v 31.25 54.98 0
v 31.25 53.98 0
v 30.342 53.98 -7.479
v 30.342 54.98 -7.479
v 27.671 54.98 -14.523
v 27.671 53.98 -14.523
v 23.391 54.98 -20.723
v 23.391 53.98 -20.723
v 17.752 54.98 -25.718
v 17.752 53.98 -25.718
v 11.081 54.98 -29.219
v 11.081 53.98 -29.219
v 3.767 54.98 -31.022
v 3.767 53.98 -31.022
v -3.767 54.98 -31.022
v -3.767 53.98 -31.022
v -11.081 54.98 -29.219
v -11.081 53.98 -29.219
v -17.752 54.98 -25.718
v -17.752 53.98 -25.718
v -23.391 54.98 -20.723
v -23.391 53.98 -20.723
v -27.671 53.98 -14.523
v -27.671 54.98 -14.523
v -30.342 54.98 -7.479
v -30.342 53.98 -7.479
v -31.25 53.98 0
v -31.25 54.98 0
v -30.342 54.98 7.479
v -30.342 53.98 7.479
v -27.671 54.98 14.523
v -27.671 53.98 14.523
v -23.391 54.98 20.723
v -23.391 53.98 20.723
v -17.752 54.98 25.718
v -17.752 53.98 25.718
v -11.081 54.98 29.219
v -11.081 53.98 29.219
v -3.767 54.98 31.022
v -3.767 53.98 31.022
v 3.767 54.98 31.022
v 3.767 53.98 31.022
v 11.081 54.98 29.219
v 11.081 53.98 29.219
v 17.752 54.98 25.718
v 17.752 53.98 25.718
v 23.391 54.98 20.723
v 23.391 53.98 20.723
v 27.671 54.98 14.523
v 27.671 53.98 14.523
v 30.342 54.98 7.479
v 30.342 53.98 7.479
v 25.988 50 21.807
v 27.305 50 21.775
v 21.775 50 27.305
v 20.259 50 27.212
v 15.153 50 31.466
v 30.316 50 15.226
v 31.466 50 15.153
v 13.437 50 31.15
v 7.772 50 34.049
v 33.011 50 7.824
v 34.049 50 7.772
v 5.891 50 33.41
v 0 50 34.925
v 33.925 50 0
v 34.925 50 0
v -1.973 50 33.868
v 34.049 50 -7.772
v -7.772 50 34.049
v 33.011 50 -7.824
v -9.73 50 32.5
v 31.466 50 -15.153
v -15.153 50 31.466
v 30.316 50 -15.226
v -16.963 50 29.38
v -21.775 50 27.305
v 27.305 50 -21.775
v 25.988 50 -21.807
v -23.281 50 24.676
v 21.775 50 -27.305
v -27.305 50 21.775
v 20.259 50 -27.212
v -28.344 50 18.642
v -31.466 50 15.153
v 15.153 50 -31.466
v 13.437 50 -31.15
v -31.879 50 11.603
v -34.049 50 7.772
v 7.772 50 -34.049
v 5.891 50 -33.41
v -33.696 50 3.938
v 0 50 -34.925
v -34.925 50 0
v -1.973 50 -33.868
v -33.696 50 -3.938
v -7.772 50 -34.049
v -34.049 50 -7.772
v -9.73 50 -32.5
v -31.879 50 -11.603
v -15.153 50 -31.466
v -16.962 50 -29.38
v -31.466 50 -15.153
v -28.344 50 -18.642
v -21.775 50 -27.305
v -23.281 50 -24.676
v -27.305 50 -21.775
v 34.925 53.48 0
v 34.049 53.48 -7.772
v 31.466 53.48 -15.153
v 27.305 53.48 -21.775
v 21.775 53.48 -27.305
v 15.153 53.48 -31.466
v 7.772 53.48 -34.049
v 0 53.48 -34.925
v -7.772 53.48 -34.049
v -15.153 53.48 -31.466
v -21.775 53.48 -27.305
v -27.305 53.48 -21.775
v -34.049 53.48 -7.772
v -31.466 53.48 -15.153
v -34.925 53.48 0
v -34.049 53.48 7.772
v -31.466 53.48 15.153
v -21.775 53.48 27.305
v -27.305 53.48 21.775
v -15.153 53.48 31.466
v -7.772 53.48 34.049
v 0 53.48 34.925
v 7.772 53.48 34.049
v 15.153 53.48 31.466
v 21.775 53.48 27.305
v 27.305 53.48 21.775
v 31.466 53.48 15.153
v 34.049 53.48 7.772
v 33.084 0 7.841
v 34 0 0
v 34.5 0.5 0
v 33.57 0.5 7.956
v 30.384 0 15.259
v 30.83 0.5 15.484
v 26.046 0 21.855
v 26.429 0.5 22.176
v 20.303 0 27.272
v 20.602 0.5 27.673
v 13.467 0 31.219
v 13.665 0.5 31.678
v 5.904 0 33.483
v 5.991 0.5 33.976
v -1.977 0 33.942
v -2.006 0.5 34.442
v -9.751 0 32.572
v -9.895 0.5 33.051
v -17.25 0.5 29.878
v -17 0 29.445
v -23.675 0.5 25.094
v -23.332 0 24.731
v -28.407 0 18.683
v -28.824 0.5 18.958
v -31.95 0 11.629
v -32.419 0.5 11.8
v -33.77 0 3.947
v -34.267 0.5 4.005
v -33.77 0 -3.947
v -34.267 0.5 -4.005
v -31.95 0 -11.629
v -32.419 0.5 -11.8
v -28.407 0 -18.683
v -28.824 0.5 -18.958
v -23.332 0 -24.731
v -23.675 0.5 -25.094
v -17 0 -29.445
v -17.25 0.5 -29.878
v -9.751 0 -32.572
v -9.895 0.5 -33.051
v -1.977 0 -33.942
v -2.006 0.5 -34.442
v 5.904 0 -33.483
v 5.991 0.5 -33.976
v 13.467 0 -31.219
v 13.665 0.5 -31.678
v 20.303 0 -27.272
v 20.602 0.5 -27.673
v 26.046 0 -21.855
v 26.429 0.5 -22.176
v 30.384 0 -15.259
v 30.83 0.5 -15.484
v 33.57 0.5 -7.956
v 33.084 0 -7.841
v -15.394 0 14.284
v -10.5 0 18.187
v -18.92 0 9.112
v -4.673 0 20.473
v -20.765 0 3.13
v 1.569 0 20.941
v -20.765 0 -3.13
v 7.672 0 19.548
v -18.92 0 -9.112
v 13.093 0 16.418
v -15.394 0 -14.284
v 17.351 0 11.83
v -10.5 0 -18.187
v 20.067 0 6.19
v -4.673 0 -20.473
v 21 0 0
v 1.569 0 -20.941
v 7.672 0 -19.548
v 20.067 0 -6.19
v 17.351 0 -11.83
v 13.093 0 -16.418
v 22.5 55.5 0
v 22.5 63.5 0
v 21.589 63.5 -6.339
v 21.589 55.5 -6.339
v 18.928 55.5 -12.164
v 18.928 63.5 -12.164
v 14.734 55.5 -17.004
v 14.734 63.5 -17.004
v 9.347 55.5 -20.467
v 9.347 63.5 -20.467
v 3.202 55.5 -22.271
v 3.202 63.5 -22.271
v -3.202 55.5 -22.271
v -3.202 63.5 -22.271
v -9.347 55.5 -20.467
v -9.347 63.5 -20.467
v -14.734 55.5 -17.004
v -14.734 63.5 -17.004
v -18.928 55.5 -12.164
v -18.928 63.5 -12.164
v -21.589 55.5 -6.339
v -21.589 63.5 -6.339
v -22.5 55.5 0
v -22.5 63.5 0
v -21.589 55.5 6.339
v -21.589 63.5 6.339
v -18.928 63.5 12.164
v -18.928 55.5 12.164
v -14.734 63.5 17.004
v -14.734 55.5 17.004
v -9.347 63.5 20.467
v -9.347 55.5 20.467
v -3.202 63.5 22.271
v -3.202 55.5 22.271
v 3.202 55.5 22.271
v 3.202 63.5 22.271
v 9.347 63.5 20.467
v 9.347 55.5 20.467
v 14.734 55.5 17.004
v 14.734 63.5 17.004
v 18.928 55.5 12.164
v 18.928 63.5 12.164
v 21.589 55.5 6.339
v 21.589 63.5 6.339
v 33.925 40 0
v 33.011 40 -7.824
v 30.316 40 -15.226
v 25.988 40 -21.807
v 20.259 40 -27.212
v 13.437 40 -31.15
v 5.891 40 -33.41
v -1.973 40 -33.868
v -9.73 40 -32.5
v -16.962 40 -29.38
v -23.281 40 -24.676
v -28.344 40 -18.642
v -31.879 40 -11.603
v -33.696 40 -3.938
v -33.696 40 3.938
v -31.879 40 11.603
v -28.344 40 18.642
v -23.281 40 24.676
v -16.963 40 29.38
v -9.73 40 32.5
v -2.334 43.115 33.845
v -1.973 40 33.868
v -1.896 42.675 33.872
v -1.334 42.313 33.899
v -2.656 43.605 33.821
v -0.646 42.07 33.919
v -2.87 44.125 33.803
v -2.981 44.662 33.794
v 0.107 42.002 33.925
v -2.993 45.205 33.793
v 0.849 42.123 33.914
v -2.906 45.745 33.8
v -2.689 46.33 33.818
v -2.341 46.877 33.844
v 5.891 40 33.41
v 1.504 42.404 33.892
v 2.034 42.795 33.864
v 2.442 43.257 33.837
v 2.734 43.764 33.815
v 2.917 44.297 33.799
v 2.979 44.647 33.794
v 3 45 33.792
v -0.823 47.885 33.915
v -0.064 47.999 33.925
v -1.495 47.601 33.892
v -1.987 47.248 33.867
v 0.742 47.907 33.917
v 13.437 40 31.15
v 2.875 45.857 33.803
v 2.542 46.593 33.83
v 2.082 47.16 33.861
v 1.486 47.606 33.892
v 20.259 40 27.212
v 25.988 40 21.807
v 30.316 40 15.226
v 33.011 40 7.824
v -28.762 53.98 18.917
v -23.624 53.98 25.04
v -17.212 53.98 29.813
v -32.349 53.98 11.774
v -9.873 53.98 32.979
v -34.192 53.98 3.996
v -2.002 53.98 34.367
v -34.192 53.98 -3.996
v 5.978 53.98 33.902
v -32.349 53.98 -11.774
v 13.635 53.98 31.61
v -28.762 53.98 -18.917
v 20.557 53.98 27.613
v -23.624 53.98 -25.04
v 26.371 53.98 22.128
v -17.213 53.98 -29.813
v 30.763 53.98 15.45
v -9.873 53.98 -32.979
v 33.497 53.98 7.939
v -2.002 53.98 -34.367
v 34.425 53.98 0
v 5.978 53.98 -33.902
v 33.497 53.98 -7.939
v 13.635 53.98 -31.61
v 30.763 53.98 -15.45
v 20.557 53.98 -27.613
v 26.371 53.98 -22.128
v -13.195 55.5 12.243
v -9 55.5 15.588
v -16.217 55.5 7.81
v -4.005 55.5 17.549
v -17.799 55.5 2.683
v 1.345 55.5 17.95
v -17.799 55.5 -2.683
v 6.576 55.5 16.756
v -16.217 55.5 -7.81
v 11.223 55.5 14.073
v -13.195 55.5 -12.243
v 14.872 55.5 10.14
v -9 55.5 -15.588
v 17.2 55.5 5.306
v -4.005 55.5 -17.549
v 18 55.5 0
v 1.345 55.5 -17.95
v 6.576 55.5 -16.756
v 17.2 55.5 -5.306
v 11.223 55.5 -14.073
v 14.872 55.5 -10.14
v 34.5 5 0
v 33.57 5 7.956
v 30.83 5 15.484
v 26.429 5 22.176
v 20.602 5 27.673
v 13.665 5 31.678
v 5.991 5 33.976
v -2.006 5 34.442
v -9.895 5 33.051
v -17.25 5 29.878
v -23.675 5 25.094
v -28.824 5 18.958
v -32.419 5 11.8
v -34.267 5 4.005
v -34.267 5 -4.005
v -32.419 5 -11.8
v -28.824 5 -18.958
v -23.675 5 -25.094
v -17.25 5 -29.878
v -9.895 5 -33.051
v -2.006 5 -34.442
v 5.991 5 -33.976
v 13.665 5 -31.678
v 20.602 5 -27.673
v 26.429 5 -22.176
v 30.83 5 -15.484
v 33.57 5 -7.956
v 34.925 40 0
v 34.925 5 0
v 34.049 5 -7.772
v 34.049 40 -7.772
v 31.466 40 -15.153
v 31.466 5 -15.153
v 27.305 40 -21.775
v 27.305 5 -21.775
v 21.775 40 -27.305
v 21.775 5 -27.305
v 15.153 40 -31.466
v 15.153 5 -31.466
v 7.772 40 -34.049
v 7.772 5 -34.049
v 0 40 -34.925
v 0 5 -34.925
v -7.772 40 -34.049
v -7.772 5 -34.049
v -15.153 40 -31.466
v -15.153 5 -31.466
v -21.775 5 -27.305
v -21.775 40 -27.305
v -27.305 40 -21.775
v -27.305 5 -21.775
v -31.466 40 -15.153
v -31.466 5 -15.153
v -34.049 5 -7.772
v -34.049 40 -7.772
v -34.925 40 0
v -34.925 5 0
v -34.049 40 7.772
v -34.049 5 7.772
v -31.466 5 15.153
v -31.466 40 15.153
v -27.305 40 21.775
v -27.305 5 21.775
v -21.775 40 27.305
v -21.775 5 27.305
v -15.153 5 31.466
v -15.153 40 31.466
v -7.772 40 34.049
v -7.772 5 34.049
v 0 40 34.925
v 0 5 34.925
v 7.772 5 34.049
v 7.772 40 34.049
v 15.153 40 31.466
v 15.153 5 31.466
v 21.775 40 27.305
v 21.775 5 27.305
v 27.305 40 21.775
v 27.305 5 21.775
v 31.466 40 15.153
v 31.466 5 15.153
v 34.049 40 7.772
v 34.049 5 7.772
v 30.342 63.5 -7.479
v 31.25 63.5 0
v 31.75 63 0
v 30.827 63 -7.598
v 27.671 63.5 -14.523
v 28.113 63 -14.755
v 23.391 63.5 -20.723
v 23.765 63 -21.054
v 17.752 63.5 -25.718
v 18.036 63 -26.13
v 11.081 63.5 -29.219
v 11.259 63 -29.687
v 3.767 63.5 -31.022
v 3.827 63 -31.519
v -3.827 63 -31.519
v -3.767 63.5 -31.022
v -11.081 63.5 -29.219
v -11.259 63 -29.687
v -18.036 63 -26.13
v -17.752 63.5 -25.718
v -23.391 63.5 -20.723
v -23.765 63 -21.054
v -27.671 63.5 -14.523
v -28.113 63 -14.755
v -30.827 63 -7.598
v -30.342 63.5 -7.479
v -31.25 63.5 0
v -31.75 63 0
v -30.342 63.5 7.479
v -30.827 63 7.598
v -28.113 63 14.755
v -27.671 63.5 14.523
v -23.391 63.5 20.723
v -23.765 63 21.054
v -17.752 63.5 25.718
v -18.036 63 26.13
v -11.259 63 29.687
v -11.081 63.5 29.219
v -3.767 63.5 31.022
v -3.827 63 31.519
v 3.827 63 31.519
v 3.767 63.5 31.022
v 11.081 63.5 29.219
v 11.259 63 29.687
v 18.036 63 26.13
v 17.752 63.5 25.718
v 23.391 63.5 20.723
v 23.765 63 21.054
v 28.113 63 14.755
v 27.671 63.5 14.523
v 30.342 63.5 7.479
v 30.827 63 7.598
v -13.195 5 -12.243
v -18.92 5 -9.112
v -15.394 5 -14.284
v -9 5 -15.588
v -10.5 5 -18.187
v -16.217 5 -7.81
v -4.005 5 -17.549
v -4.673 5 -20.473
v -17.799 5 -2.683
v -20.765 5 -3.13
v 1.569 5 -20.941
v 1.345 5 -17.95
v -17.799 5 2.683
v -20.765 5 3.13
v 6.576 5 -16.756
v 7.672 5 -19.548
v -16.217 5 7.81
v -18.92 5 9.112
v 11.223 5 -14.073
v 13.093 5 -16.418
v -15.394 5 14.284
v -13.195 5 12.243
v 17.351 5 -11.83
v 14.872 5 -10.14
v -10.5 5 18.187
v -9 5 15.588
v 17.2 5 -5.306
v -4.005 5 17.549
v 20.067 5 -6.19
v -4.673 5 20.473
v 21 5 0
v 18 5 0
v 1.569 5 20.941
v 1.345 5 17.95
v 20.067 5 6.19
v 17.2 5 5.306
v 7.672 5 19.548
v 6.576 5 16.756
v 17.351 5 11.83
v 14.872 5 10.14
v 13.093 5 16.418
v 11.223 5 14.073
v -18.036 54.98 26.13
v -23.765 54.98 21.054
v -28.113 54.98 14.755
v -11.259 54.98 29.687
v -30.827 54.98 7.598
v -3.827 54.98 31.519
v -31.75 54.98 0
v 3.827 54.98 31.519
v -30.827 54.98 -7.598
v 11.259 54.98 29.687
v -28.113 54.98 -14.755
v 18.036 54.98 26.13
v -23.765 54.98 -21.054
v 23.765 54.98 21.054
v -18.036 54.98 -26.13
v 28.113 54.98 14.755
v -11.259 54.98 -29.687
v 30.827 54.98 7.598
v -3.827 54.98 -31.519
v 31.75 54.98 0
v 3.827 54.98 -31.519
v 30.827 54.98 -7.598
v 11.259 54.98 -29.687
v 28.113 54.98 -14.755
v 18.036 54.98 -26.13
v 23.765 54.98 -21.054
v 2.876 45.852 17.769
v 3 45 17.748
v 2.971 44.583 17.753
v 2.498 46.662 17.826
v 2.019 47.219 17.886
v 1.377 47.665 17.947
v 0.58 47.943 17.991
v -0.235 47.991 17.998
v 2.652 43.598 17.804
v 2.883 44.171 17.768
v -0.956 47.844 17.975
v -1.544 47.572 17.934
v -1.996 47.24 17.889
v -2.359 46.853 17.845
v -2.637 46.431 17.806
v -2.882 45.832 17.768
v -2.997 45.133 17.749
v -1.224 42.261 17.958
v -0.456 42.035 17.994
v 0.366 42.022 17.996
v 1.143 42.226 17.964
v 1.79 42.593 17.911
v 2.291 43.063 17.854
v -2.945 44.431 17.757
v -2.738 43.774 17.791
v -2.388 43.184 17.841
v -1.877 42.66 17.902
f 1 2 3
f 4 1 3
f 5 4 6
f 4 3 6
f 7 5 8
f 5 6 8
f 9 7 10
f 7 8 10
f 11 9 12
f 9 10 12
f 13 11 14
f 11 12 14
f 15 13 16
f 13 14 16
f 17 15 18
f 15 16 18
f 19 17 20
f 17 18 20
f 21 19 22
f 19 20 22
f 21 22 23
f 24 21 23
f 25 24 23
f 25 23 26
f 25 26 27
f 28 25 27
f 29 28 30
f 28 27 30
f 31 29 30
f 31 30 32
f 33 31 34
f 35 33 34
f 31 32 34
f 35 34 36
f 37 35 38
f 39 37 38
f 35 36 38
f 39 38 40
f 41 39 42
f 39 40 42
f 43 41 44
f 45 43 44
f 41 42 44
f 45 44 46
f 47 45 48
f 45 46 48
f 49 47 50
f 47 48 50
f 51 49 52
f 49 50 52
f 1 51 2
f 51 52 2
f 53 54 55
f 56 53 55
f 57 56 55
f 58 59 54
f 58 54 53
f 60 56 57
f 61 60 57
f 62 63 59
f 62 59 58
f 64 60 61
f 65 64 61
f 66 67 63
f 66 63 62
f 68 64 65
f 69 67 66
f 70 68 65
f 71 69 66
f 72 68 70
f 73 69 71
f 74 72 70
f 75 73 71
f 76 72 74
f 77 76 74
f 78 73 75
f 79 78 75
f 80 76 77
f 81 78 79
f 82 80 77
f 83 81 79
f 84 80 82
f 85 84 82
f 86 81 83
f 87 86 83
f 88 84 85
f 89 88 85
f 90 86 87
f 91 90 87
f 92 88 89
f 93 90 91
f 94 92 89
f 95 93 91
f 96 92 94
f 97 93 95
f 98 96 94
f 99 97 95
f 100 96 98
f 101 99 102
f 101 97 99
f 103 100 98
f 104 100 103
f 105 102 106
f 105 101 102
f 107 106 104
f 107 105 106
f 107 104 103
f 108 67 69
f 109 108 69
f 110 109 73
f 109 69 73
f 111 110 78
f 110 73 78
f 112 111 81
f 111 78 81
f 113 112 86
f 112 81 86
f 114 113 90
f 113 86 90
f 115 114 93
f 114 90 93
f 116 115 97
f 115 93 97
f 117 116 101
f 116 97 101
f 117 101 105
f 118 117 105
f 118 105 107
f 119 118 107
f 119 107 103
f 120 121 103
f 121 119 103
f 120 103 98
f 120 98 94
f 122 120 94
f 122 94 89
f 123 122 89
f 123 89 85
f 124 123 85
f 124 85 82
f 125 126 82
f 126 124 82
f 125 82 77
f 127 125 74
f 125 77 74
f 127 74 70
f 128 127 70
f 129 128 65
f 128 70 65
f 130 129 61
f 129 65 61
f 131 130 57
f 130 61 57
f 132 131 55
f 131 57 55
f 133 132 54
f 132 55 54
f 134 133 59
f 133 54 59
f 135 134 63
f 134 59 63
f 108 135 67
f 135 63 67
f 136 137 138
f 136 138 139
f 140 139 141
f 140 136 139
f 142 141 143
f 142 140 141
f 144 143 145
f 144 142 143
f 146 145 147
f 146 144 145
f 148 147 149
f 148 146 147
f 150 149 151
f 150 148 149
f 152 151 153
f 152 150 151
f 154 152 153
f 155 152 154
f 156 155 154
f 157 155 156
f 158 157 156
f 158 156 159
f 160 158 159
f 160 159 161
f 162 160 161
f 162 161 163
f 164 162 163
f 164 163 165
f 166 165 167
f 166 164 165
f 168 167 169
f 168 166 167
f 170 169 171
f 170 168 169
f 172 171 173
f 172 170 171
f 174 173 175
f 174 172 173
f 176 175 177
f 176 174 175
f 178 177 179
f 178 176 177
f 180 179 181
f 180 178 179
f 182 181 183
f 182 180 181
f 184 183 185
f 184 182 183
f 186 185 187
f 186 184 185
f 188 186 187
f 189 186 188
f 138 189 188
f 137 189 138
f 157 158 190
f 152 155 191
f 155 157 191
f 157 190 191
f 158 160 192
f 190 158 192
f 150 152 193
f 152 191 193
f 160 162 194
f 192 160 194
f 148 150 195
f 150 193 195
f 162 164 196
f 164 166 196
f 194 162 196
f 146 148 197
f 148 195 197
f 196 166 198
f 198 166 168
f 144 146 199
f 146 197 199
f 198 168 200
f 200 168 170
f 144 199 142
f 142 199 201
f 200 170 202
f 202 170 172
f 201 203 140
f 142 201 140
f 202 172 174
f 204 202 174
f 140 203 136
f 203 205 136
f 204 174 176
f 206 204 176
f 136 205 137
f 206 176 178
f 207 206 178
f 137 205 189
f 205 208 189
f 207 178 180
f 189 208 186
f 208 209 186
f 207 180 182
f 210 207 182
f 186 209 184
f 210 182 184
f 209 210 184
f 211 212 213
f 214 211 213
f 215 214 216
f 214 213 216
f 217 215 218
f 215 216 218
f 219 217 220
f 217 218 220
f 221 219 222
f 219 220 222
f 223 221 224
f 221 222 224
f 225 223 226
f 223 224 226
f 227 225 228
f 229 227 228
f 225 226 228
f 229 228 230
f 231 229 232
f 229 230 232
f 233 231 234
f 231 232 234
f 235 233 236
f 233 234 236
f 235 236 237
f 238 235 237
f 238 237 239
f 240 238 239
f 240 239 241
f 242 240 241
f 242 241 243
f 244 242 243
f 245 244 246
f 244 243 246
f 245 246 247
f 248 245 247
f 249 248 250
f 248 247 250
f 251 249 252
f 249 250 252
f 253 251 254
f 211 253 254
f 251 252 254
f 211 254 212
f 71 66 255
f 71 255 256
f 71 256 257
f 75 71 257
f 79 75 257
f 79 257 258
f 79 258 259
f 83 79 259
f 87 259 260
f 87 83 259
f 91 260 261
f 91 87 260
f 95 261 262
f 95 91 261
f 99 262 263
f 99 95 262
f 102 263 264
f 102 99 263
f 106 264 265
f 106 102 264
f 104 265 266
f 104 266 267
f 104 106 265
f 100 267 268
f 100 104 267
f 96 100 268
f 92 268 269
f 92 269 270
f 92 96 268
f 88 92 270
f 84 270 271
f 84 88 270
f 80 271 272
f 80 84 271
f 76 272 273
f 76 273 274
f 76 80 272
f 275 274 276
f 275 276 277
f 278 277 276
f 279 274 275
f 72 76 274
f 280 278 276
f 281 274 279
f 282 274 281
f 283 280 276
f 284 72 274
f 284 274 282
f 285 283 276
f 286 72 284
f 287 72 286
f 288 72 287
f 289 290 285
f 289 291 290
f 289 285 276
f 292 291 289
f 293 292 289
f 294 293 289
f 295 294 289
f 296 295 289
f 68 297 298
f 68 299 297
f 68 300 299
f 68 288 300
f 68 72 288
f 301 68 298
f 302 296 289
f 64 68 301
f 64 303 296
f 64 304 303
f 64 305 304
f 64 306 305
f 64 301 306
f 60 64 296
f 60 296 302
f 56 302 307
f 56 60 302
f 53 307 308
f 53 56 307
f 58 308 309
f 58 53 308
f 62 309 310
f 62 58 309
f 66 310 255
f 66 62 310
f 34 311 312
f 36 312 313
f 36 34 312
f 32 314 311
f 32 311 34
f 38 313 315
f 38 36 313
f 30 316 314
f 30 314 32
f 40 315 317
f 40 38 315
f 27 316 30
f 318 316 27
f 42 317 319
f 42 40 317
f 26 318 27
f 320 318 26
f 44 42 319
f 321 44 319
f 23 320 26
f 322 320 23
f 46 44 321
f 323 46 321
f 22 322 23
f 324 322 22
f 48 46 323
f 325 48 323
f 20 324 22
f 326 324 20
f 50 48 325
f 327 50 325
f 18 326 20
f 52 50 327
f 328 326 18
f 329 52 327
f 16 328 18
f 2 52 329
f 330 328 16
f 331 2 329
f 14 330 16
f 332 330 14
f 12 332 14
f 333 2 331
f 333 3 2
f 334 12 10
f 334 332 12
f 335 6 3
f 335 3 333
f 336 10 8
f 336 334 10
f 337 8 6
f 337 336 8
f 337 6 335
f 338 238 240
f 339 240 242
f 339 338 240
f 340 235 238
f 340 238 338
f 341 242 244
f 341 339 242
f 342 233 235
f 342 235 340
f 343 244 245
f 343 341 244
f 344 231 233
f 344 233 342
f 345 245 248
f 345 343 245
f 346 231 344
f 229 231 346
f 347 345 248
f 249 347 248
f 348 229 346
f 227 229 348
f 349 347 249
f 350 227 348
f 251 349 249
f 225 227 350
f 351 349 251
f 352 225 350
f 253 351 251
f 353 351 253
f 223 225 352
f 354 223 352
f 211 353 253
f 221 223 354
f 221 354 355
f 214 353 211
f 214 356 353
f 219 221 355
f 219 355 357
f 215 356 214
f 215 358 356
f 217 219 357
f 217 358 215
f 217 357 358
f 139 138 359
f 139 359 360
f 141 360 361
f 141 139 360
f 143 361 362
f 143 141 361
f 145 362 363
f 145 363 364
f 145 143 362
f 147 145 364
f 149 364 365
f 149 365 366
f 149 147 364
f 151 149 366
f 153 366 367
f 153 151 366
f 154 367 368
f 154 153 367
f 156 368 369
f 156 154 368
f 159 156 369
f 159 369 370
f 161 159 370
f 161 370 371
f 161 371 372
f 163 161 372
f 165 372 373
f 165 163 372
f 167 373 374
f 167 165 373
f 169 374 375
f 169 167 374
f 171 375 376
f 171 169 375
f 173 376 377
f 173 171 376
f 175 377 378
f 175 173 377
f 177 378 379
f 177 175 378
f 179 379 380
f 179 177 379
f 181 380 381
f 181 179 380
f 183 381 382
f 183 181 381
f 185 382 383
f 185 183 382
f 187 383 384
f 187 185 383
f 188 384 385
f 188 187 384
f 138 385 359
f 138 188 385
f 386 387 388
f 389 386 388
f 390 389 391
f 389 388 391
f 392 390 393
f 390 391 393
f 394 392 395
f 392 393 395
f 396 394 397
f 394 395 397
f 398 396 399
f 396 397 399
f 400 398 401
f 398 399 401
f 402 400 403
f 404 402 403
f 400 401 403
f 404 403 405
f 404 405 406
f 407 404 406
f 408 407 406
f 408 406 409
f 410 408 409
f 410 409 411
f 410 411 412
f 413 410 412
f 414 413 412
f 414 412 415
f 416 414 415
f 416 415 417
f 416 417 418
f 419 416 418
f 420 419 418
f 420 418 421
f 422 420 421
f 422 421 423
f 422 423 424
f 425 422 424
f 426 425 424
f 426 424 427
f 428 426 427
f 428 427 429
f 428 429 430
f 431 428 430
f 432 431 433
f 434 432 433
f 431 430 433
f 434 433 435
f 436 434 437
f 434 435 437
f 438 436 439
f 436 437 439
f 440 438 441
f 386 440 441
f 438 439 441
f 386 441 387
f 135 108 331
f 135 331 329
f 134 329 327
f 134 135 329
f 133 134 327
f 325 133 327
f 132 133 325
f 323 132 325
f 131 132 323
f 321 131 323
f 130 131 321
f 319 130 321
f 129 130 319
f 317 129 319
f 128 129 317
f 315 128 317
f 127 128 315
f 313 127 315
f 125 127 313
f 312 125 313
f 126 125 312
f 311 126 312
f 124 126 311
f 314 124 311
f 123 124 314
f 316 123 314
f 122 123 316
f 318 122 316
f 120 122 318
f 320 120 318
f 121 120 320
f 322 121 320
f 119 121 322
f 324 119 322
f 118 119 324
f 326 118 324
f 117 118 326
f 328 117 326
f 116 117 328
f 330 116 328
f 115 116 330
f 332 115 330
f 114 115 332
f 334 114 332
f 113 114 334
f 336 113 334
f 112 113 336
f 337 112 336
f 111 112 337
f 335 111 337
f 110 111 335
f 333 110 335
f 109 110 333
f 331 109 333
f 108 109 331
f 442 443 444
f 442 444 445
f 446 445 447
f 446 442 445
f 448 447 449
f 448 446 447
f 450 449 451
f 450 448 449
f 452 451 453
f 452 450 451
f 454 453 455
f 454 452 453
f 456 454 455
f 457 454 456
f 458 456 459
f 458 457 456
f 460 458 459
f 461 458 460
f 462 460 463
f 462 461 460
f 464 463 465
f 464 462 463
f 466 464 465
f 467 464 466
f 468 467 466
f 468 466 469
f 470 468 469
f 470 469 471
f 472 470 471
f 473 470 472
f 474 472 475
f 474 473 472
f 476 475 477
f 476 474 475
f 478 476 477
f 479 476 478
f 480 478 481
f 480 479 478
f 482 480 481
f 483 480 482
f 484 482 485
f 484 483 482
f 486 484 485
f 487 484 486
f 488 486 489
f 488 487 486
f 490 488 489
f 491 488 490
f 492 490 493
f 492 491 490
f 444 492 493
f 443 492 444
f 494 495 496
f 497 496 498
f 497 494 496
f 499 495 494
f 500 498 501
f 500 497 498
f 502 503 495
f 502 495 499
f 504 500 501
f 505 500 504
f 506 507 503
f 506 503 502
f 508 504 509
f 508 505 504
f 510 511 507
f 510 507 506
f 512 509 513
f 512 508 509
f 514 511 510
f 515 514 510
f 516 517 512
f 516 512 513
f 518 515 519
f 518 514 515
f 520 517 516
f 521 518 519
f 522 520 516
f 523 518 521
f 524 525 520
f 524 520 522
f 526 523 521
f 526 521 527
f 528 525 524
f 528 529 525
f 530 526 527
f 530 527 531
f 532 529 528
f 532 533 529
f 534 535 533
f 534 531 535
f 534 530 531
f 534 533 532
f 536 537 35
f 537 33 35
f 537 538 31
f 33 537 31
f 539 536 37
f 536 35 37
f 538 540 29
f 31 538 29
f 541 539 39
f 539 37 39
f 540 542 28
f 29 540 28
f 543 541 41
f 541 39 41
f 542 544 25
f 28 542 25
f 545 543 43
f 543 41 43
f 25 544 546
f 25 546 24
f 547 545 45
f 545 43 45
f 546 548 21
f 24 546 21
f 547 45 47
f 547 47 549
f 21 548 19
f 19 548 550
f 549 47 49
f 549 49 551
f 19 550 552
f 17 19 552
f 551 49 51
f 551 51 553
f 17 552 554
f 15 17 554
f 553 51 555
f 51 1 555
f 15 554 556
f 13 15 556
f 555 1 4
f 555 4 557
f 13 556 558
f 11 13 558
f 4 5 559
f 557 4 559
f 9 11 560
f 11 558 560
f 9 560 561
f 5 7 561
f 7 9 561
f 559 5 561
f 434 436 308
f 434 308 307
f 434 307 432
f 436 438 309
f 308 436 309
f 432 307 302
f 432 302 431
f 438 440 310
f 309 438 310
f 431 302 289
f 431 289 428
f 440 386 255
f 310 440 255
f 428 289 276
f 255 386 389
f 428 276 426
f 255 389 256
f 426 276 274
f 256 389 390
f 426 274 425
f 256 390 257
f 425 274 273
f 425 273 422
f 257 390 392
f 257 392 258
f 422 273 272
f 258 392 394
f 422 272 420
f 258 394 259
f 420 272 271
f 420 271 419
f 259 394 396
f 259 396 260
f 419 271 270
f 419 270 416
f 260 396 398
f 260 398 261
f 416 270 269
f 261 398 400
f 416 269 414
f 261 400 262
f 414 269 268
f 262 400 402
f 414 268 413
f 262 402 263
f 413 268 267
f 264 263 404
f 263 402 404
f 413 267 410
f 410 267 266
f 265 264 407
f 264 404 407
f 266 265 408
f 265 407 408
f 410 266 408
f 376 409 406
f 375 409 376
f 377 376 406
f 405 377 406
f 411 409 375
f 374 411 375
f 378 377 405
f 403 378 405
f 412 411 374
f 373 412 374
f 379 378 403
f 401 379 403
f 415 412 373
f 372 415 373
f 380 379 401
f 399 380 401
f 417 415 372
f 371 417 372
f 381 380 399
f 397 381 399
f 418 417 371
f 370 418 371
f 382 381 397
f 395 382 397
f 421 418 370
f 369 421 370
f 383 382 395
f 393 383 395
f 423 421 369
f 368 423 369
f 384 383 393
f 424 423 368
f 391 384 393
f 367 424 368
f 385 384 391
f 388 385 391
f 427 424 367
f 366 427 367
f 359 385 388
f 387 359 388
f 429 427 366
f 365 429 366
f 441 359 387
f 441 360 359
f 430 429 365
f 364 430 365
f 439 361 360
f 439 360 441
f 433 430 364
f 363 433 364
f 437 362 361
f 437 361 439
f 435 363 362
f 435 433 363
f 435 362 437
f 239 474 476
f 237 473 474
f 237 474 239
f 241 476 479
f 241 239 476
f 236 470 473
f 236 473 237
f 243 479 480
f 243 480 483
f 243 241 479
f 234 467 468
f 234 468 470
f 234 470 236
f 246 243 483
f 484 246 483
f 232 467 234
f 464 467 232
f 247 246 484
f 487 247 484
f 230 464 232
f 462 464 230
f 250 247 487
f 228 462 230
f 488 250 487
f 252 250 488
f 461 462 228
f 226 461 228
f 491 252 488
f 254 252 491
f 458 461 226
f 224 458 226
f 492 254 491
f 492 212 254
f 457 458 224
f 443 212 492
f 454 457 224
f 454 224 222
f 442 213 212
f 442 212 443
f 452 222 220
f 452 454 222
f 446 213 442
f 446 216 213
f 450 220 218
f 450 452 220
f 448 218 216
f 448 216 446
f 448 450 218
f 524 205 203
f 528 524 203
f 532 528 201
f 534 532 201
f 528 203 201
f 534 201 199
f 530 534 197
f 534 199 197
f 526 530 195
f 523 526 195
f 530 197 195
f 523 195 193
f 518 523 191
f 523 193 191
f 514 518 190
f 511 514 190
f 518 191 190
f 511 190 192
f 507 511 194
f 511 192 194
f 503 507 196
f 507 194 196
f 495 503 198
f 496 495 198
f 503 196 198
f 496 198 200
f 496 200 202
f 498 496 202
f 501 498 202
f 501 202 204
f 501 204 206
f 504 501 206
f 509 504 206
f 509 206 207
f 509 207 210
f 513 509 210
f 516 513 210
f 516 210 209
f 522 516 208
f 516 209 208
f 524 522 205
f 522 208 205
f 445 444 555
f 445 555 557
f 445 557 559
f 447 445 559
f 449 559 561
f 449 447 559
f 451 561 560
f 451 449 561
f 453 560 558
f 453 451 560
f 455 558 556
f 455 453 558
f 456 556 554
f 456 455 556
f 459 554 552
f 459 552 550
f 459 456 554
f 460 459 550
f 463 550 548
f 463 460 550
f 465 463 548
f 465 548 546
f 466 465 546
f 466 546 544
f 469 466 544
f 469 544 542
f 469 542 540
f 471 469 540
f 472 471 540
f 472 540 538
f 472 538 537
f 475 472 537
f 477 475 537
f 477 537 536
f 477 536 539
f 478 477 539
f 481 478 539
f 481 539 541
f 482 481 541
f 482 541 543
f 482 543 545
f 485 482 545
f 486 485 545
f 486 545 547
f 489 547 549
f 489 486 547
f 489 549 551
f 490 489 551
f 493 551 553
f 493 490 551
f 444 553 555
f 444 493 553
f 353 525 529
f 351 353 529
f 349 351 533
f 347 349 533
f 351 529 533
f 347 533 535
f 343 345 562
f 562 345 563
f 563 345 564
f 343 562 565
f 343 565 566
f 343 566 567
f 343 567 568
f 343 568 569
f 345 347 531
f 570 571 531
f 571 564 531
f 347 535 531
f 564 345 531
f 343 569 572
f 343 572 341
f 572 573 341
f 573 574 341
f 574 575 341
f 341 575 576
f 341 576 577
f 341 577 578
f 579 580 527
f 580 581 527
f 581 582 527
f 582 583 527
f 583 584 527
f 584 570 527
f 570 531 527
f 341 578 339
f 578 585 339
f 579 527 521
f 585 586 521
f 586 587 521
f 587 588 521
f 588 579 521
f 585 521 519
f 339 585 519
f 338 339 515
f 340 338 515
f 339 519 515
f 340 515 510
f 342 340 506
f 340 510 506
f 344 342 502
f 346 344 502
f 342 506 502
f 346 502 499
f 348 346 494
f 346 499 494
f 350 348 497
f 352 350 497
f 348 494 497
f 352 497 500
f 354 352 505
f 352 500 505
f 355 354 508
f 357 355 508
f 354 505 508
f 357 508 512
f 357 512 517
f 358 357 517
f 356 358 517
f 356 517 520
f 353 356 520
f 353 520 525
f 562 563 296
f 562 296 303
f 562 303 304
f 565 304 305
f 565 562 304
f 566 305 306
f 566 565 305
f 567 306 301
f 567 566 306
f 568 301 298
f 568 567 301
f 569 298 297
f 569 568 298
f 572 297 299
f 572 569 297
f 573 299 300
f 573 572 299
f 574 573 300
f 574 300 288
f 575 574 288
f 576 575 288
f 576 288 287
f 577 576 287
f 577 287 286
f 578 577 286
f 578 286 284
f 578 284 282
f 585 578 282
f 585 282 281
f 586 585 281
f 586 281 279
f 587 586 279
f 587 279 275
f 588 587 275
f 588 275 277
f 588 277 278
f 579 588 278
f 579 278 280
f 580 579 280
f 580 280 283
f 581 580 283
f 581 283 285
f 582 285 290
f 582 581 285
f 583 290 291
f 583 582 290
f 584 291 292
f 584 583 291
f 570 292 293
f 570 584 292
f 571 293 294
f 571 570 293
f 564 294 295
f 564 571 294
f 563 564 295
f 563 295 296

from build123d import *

# Parameters (mm, degrees)
SKETCH1_R                      = 34.925
MAIN_BODY_DEPTH                = 63.5
SKETCH2_OUTSIDE_W              = 95.336
SKETCH2_OUTSIDE_H              = 95.336
SKETCH2_OUTSIDE_R              = 34.5
BOTTOM_STEP_DEPTH              = 5
SKETCH3_OUTSIDE_W              = 95.336
SKETCH3_OUTSIDE_H              = 95.336
SKETCH3_OUTSIDE_R              = 31.75
TOP_DIAMETER_DEPTH             = 9.52
SKETCH4_OUTSIDE_W              = 95.336
SKETCH4_OUTSIDE_H              = 95.336
SKETCH4_OUTSIDE_R              = 31.25
CUT_EXTRUDE3_DEPTH             = 1
SKETCH5_R                      = 22.5
INSERT_BORE_DEPTH              = 8
SKETCH6_R                      = 18
CUT_EXTRUDE5_DEPTH             = 64.5
SKETCH7_R                      = 21
CUT_EXTRUDE6_DEPTH             = 5
BOTTOM_EDGE_CHAMFER_SIZE2      = 0.499999887
BOTTOM_EDGE_CHAMFER_SIZE       = 0.5
TOP_FACE_CHAMFER_SIZE2         = 0.499999887
TOP_FACE_CHAMFER_SIZE          = 0.5
BODY_TO_TOP_FACE_CHAMFER_SIZE2 = 0.499999887
BODY_TO_TOP_FACE_CHAMFER_SIZE  = 0.5
SKETCH8_W                      = 1
SKETCH8_H                      = 10
SKETCH9_R                      = 3
OIL_HOLE_DEPTH                 = 35.925


with BuildPart() as part:
    # Sketch1 → Main Body (new body)
    with BuildSketch(Plane(origin=(0, 0, 0), x_dir=(1, 0, 0), z_dir=(0, 1, 0))):
        Circle(SKETCH1_R)
    extrude(amount=MAIN_BODY_DEPTH)

    # Sketch2 outside → Bottom Step (cut)
    with BuildSketch(Plane.XZ):
        Rectangle(SKETCH2_OUTSIDE_W, SKETCH2_OUTSIDE_H)
        Circle(SKETCH2_OUTSIDE_R, mode=Mode.SUBTRACT)
    extrude(amount=-BOTTOM_STEP_DEPTH, mode=Mode.SUBTRACT)

    # Sketch3 outside → Top Diameter (cut)
    with BuildSketch(Plane(origin=(0, 63.5, 0), x_dir=(1, 0, 0), z_dir=(0, 1, 0))):
        Rectangle(SKETCH3_OUTSIDE_W, SKETCH3_OUTSIDE_H)
        Circle(SKETCH3_OUTSIDE_R, mode=Mode.SUBTRACT)
    extrude(amount=-TOP_DIAMETER_DEPTH, mode=Mode.SUBTRACT)

    # Sketch4 outside → Cut-Extrude3 (cut)
    with BuildSketch(Plane(origin=(0, 53.98, 0), x_dir=(1, 0, 0), z_dir=(0, 1, 0))):
        Rectangle(SKETCH4_OUTSIDE_W, SKETCH4_OUTSIDE_H)
        Circle(SKETCH4_OUTSIDE_R, mode=Mode.SUBTRACT)
    extrude(amount=CUT_EXTRUDE3_DEPTH, mode=Mode.SUBTRACT)

    # Sketch5 → Insert Bore (cut)
    with BuildSketch(Plane(origin=(0, 63.5, 0), x_dir=(1, 0, 0), z_dir=(0, 1, 0))):
        Circle(SKETCH5_R)
    extrude(amount=-INSERT_BORE_DEPTH, mode=Mode.SUBTRACT)

    # Sketch6 → Cut-Extrude5 (cut, through all)
    with BuildSketch(Plane.XZ):
        Circle(SKETCH6_R)
    extrude(amount=-CUT_EXTRUDE5_DEPTH, mode=Mode.SUBTRACT)

    # Sketch7 → Cut-Extrude6 (cut)
    with BuildSketch(Plane.XZ):
        Circle(SKETCH7_R)
    extrude(amount=-CUT_EXTRUDE6_DEPTH, mode=Mode.SUBTRACT)

    # Bottom Edge Chamfer
    bottom_edge_chamfer_edges = [part.edges().sort_by_distance(p)[0] for p in [
        (-34.5, 0, 0),
    ]]
    chamfer(bottom_edge_chamfer_edges, length=BOTTOM_EDGE_CHAMFER_SIZE, length2=BOTTOM_EDGE_CHAMFER_SIZE2)

    # Top Face Chamfer
    top_face_chamfer_edges = [part.edges().sort_by_distance(p)[0] for p in [
        (-31.75, 63.5, 0),
    ]]
    chamfer(top_face_chamfer_edges, length=TOP_FACE_CHAMFER_SIZE, length2=TOP_FACE_CHAMFER_SIZE2)

    # Body To Top Face Chamfer
    body_to_top_face_chamfer_edges = [part.edges().sort_by_distance(p)[0] for p in [
        (-34.925, 53.98, 0),
    ]]
    chamfer(body_to_top_face_chamfer_edges, length=BODY_TO_TOP_FACE_CHAMFER_SIZE, length2=BODY_TO_TOP_FACE_CHAMFER_SIZE2)

    # Sketch8 → Oil Groove (revolve, cut)
    with BuildSketch(Plane.XY):
        with Locations((34.425, 45)):
            Rectangle(SKETCH8_W, SKETCH8_H)
    revolve(axis=Axis((0, 0, 0), (0, 1, 0)), mode=Mode.SUBTRACT)

    # Sketch9 → Oil Hole (cut, through all)
    with BuildSketch(Plane.XY):
        with Locations((0, 45)):
            Circle(SKETCH9_R)
    extrude(amount=OIL_HOLE_DEPTH, mode=Mode.SUBTRACT)


solid = part.part
